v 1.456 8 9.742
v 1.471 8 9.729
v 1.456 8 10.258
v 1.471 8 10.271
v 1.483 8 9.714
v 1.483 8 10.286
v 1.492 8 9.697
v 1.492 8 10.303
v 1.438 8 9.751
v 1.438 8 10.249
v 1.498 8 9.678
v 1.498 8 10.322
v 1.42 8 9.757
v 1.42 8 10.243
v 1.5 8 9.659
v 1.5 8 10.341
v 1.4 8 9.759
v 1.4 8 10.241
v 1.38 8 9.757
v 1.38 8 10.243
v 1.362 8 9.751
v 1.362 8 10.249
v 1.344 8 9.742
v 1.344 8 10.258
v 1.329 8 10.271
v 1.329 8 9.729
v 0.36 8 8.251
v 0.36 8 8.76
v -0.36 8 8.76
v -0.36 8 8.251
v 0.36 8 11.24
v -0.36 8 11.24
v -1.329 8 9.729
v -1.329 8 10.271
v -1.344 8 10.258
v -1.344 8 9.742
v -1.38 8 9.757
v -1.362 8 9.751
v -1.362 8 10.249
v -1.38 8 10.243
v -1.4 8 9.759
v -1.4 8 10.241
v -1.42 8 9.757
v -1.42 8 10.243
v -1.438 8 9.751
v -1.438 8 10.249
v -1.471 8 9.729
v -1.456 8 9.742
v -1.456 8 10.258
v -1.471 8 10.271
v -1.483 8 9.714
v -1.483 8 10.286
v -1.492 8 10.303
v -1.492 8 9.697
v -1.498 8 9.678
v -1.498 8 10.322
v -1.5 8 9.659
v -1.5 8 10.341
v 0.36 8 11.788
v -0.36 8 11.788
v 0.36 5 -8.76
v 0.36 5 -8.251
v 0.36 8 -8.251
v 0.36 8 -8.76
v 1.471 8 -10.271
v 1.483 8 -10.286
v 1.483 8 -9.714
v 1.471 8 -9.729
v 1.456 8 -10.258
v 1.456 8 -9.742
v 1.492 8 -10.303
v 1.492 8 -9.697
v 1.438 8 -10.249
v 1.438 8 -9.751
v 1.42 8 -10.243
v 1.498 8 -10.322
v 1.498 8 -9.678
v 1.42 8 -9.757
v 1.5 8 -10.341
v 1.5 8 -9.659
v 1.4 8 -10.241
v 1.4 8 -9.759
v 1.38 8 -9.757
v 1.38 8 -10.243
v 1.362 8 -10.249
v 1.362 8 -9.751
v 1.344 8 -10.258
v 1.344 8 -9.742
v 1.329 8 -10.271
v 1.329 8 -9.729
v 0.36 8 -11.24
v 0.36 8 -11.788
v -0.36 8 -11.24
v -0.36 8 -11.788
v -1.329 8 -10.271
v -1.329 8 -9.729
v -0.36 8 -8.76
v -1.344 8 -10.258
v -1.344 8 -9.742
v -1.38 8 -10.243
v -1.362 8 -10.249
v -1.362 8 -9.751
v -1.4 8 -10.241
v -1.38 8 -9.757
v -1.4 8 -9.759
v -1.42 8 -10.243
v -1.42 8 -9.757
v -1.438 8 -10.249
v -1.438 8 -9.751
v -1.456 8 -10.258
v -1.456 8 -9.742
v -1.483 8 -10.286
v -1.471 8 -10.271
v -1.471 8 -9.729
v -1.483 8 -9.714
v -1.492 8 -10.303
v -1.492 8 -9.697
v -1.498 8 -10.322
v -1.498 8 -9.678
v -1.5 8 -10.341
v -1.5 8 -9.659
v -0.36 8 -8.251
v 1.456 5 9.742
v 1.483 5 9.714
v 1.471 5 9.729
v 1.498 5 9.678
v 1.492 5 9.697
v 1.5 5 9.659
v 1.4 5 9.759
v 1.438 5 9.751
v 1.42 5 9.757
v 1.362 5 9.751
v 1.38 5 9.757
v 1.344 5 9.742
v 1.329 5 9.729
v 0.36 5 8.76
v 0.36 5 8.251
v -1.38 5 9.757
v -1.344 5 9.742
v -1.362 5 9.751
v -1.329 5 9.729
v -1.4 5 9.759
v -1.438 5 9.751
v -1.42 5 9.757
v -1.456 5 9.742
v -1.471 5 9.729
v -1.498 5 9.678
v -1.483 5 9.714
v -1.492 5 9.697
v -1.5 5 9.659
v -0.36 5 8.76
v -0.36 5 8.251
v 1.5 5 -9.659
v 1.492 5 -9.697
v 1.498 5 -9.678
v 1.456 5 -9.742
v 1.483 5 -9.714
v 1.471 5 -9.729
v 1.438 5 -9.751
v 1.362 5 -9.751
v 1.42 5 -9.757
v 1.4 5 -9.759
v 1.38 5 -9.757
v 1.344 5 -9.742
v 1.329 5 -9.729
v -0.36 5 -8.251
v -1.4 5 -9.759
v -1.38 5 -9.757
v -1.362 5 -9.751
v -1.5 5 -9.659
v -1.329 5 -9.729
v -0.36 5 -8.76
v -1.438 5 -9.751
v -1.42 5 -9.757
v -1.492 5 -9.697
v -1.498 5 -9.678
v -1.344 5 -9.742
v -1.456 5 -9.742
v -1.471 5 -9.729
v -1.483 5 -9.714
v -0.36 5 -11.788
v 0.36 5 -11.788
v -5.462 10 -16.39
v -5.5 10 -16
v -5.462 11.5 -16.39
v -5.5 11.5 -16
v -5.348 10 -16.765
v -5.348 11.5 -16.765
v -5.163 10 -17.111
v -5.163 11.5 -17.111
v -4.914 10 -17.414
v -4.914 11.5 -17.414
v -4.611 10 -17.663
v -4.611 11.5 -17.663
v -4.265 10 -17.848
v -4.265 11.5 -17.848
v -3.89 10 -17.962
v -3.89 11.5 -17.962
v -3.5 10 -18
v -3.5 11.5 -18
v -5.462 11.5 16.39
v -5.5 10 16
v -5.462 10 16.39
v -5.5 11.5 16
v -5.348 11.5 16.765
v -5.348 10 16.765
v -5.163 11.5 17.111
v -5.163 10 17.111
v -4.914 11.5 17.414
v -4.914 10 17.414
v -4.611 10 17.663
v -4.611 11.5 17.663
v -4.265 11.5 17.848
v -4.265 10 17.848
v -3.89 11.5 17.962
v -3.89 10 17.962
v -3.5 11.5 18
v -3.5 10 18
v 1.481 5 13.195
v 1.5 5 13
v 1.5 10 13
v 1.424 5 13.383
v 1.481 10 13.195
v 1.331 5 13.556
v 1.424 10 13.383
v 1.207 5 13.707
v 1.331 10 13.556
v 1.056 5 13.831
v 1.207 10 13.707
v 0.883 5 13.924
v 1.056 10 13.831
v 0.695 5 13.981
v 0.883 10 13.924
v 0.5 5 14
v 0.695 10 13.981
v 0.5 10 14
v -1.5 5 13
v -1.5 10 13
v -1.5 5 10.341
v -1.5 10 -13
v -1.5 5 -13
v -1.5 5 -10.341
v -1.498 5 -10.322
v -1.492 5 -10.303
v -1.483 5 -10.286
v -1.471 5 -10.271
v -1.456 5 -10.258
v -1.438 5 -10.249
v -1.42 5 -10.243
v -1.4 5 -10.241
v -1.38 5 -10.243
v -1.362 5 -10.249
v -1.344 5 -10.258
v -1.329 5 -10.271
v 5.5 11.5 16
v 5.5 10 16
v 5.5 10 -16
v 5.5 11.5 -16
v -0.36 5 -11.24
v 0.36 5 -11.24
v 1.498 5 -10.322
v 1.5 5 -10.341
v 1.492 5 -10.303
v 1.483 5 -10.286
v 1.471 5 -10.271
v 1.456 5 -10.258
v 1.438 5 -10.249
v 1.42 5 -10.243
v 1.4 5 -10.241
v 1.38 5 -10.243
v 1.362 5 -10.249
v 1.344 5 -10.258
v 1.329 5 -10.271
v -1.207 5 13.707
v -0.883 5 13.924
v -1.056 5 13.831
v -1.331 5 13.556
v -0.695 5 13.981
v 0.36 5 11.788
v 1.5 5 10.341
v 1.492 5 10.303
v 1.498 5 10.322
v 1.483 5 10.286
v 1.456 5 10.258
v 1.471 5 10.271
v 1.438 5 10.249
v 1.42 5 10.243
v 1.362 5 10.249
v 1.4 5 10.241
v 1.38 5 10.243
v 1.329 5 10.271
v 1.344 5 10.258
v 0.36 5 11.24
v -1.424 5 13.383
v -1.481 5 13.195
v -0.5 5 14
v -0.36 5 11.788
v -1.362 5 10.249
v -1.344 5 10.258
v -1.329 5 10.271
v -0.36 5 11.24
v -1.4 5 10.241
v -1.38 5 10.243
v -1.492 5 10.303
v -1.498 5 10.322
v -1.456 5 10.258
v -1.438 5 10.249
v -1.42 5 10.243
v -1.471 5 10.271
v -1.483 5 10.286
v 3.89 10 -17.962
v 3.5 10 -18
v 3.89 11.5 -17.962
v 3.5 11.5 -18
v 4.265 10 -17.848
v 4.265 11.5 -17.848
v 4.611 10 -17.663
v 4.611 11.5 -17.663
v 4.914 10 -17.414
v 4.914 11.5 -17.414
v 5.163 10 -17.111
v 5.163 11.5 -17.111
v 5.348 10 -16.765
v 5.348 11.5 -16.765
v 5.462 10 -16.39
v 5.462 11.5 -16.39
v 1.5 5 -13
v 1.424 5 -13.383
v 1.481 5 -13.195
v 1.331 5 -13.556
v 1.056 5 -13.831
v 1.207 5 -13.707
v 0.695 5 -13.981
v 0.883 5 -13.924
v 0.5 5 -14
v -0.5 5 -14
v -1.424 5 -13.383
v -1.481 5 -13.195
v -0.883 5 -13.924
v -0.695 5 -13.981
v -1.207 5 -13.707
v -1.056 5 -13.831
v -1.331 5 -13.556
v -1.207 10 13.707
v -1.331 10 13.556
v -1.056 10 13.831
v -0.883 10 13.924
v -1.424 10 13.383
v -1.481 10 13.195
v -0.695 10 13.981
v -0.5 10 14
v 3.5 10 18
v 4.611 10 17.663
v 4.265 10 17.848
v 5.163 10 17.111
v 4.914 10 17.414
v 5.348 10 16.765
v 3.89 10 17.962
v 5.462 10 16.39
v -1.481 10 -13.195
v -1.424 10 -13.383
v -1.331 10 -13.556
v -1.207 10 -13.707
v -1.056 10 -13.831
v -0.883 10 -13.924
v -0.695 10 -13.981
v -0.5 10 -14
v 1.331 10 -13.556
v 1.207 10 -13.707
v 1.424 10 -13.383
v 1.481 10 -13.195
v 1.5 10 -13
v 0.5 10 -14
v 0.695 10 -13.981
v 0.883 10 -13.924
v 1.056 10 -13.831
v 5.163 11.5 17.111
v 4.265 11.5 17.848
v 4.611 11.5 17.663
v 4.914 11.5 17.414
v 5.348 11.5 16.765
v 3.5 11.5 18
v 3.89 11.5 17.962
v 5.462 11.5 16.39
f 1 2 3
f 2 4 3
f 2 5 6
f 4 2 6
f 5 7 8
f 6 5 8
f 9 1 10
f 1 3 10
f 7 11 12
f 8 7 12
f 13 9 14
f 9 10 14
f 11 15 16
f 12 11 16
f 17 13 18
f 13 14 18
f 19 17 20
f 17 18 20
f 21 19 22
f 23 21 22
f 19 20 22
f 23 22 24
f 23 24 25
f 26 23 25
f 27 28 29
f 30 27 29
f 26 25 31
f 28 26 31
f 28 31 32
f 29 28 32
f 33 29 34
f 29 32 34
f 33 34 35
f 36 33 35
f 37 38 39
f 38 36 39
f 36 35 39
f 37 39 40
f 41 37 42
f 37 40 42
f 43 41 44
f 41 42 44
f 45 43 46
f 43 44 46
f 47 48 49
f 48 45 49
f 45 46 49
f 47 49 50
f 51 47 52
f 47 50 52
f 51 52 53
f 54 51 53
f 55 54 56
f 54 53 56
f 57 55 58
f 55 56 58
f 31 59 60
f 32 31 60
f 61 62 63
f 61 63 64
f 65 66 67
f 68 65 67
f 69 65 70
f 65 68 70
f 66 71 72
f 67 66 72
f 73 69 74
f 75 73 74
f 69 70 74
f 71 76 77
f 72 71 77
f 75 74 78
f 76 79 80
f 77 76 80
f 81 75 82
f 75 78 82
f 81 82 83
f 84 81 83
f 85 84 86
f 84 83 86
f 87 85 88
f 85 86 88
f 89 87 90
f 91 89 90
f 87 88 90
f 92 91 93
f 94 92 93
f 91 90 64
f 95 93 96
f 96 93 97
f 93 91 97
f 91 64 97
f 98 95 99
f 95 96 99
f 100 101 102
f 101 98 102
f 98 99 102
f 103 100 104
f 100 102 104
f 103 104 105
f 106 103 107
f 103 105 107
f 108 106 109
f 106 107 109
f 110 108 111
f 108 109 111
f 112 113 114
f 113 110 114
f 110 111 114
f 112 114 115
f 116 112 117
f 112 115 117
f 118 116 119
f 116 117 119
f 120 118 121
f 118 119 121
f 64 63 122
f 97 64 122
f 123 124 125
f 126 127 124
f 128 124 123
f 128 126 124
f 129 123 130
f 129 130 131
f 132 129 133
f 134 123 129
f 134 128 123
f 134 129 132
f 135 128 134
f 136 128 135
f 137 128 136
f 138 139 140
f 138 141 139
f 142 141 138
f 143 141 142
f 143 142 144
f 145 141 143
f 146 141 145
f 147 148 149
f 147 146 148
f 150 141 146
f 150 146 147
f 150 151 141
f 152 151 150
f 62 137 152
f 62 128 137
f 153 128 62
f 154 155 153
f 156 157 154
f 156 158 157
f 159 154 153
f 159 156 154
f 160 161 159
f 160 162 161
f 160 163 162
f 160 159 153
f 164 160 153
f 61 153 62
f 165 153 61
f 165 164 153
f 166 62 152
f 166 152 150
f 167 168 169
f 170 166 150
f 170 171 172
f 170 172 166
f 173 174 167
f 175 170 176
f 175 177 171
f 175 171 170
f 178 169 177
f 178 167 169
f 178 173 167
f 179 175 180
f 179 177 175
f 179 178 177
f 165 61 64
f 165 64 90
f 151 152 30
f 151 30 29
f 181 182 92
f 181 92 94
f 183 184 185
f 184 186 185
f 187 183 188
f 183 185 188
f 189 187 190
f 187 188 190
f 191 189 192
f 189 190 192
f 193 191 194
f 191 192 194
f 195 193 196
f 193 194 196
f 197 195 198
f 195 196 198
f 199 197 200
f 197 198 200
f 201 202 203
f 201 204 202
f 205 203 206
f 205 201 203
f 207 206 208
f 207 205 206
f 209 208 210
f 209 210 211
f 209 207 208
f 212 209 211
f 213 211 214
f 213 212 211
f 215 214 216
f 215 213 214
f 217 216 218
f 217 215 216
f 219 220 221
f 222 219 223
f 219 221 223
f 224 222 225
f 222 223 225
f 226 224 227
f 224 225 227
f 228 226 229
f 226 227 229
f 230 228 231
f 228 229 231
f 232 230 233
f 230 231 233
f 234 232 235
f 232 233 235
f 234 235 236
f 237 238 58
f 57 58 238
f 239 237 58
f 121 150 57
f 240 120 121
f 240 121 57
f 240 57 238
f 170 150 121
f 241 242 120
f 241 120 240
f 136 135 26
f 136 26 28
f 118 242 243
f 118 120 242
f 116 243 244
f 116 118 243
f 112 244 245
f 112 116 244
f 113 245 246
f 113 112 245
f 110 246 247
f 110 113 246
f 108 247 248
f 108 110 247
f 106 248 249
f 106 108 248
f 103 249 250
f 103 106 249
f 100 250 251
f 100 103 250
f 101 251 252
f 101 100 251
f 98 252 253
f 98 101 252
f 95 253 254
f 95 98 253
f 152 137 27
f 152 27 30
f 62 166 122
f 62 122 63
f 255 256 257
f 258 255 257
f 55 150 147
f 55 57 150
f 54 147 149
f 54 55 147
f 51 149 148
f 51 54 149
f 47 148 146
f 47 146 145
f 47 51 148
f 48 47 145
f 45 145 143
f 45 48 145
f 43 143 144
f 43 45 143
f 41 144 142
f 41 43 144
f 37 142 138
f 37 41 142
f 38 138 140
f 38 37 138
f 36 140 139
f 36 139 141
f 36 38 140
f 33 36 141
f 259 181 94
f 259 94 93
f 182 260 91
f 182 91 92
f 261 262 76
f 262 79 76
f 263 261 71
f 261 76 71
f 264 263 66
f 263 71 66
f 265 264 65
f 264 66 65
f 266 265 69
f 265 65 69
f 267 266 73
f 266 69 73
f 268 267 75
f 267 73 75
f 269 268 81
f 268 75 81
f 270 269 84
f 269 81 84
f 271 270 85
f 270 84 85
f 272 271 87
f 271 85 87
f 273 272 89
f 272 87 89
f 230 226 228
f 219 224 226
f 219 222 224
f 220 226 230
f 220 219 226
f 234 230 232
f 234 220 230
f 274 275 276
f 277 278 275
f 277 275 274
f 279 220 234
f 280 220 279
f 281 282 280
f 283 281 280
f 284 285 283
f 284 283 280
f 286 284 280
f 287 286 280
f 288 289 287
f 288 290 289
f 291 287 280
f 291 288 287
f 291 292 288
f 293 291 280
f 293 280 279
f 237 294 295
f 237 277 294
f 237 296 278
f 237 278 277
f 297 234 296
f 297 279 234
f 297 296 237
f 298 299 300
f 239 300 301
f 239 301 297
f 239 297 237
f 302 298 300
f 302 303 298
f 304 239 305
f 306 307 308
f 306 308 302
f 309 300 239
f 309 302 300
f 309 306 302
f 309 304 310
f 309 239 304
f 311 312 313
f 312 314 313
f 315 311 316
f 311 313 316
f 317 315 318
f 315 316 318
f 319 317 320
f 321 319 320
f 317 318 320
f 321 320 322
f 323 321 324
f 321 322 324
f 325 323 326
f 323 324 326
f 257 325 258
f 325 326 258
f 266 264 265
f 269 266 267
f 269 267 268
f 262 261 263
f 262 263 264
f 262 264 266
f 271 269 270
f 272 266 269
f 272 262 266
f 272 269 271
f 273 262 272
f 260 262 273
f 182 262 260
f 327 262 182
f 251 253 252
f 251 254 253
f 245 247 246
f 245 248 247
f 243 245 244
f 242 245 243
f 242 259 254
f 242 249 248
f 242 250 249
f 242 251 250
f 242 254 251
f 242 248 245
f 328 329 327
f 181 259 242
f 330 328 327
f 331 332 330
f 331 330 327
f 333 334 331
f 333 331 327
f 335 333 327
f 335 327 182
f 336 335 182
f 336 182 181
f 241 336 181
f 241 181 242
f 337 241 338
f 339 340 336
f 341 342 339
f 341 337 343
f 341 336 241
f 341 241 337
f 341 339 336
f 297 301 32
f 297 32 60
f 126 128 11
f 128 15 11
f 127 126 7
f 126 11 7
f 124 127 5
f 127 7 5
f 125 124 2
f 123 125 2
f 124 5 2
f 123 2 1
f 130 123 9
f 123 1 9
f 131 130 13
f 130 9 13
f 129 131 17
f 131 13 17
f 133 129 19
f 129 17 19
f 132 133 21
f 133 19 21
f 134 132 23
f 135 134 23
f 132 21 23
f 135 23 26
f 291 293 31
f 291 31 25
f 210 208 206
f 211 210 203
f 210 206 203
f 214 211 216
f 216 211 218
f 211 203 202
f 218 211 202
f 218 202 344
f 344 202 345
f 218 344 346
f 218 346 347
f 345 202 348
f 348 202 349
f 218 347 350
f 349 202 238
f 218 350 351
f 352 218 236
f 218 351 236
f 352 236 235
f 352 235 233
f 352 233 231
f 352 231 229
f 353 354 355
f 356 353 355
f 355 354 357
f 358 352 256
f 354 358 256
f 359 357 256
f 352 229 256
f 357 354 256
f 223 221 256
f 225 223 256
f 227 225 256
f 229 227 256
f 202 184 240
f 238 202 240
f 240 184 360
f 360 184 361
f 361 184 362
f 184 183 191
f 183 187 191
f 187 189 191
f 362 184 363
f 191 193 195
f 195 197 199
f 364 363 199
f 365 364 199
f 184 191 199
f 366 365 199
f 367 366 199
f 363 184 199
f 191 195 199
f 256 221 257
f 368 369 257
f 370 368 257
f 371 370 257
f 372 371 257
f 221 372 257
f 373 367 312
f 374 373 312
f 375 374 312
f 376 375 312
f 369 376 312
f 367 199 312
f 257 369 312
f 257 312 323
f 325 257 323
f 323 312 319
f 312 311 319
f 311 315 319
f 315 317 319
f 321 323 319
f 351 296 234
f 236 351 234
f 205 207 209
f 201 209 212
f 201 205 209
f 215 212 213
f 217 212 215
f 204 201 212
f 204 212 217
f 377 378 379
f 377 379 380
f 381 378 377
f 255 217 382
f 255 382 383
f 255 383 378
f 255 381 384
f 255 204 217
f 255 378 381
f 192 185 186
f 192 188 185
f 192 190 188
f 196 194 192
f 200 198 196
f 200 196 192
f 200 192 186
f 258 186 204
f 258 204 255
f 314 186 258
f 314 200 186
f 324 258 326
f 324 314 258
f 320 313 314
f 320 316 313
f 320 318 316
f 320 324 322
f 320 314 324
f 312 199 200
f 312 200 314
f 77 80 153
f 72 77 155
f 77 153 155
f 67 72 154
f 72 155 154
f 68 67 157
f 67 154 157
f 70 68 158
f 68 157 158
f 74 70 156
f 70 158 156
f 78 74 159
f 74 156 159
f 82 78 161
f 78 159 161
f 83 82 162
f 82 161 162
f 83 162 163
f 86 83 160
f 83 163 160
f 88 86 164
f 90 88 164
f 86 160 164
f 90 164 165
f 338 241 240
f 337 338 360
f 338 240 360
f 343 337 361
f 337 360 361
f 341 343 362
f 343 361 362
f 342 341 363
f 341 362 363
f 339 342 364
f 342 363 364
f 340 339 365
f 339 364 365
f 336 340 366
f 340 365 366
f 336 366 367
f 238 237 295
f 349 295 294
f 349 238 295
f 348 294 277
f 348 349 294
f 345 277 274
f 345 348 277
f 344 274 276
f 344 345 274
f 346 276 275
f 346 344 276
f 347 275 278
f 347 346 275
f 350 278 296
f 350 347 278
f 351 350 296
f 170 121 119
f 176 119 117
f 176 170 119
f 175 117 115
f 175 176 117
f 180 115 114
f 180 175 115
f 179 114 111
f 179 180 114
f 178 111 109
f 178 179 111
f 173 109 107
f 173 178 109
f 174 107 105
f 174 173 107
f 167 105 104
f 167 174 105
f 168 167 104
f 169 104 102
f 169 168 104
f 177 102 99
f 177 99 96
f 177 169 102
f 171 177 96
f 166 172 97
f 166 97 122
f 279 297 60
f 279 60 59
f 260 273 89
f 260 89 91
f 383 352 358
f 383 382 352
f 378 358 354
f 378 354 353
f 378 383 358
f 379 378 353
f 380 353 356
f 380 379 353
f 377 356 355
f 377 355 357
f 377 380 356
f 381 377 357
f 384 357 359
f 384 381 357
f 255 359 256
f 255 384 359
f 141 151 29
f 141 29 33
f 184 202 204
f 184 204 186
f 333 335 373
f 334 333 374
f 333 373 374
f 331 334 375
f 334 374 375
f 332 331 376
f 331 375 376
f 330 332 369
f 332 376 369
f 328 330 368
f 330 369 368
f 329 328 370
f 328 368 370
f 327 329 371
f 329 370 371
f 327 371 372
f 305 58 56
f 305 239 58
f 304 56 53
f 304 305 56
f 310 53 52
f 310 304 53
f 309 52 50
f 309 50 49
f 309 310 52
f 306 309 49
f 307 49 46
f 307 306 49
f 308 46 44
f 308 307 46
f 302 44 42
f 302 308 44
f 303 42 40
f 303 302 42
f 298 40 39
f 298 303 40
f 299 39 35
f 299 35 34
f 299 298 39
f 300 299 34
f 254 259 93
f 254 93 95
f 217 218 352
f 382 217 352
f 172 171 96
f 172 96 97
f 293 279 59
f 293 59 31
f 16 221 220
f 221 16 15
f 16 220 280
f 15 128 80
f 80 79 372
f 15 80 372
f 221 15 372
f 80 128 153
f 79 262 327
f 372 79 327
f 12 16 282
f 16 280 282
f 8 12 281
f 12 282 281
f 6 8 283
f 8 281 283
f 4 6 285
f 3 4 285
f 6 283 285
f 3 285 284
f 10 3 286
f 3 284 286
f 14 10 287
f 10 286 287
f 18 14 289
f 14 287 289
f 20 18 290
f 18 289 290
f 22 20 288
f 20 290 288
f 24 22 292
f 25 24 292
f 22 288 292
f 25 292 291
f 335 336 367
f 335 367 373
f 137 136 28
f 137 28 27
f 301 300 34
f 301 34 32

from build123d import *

# Parameters (mm, degrees)
SKETCH_1_W          = 3
SKETCH_1_H          = 28
EXTRUDE_1_DEPTH     = 10
SKETCH_2_W          = 11
SKETCH_2_H          = 24
EXTRUDE_2_DEPTH     = 1.5
FILLET_1_R          = 1
SKETCH_3_W          = 11
SKETCH_3_H          = 36
EXTRUDE_3_DEPTH     = 1.5
FILLET_3_R          = 1
SKETCH_5_W          = 11
SKETCH_5_H          = 30
CUT_EXTRUDE_1_DEPTH = 6.5
CUT_EXTRUDE_2_DEPTH = 3
FILLET_4_R          = 2
FILLET_5_R          = 0.1


with BuildPart() as part:
    # Эскиз1 → Бобышка-Вытянуть1 (new body)
    with BuildSketch(Plane(origin=(0, 0, 0), x_dir=(1, 0, 0), z_dir=(0, 1, 0))):
        Rectangle(SKETCH_1_W, SKETCH_1_H)
    extrude(amount=EXTRUDE_1_DEPTH)

    # Эскиз2 → Бобышка-Вытянуть2 (add)
    with BuildSketch(Plane.XZ):
        Rectangle(SKETCH_2_W, SKETCH_2_H)
    extrude(amount=EXTRUDE_2_DEPTH)

    # Скругление1
    fillet_1_edges = [part.edges().sort_by_distance(p)[0] for p in [
        (-1.5, 5, -14),
        (1.5, 5, -14),
        (1.5, 5, 14),
        (-1.5, 5, 14),
    ]]
    fillet(fillet_1_edges, radius=FILLET_1_R)

    # Эскиз3 → Бобышка-Вытянуть3 (add)
    with BuildSketch(Plane(origin=(0, 10, 0), x_dir=(1, 0, 0), z_dir=(0, 1, 0))):
        Rectangle(SKETCH_3_W, SKETCH_3_H)
    extrude(amount=EXTRUDE_3_DEPTH)

    # Скругление3
    fillet_3_edges = [part.edges().sort_by_distance(p)[0] for p in [
        (5.5, -0.75, -12),
        (5.5, -0.75, 12),
        (-5.5, -0.75, 12),
        (-5.5, -0.75, -12),
    ]]
    fillet(fillet_3_edges, radius=FILLET_3_R)

    # Эскиз5 → Вырез-Вытянуть1 (cut)
    with BuildSketch(Plane(origin=(0, -1.5, 0), x_dir=(-1, 0, 0), z_dir=(0, -1, 0))):
        Rectangle(SKETCH_5_W, SKETCH_5_H)
    extrude(amount=-CUT_EXTRUDE_1_DEPTH, mode=Mode.SUBTRACT)

    # Эскиз6 → Вырез-Вытянуть2 (cut)
    with BuildSketch(Plane.XZ.offset(-5)):
        Polygon((-1.6, -10), (-0.360392927, -8.760392927), (-0.360392927, -8.250794149), (0.360392927, -8.250794149), (0.360392927, -8.760392927), (1.6, -10), (0.360392927, -11.239607073), (0.360392927, -11.788123746), (-0.360392927, -11.788123746), (-0.360392927, -11.239607073), align=None)
        Polygon((-0.360392927, 11.788123746), (0.360392927, 11.788123746), (0.360392927, 11.239607073), (1.6, 10), (0.360392927, 8.760392927), (0.360392927, 8.250794149), (-0.360392927, 8.250794149), (-0.360392927, 8.760392927), (-1.6, 10), (-0.360392927, 11.239607073), align=None)
    extrude(amount=-CUT_EXTRUDE_2_DEPTH, mode=Mode.SUBTRACT)

    # Скругление4
    fillet_4_edges = [part.edges().sort_by_distance(p)[0] for p in [
        (-5.5, 10.75, -18),
        (-5.5, 10.75, 18),
        (5.5, 10.75, 18),
        (5.5, 10.75, -18),
    ]]
    fillet(fillet_4_edges, radius=FILLET_4_R)

    # Скругление5
    fillet_5_edges = [part.edges().sort_by_distance(p)[0] for p in [
        (1.5, 6.5, 10.1),
        (1.5, 6.5, 9.9),
        (-1.5, 6.5, 9.9),
        (-1.5, 6.5, 10.1),
        (1.5, 6.5, -9.9),
        (1.5, 6.5, -10.1),
        (-1.5, 6.5, -10.1),
        (-1.5, 6.5, -9.9),
    ]]
    fillet(fillet_5_edges, radius=FILLET_5_R)


solid = part.part
